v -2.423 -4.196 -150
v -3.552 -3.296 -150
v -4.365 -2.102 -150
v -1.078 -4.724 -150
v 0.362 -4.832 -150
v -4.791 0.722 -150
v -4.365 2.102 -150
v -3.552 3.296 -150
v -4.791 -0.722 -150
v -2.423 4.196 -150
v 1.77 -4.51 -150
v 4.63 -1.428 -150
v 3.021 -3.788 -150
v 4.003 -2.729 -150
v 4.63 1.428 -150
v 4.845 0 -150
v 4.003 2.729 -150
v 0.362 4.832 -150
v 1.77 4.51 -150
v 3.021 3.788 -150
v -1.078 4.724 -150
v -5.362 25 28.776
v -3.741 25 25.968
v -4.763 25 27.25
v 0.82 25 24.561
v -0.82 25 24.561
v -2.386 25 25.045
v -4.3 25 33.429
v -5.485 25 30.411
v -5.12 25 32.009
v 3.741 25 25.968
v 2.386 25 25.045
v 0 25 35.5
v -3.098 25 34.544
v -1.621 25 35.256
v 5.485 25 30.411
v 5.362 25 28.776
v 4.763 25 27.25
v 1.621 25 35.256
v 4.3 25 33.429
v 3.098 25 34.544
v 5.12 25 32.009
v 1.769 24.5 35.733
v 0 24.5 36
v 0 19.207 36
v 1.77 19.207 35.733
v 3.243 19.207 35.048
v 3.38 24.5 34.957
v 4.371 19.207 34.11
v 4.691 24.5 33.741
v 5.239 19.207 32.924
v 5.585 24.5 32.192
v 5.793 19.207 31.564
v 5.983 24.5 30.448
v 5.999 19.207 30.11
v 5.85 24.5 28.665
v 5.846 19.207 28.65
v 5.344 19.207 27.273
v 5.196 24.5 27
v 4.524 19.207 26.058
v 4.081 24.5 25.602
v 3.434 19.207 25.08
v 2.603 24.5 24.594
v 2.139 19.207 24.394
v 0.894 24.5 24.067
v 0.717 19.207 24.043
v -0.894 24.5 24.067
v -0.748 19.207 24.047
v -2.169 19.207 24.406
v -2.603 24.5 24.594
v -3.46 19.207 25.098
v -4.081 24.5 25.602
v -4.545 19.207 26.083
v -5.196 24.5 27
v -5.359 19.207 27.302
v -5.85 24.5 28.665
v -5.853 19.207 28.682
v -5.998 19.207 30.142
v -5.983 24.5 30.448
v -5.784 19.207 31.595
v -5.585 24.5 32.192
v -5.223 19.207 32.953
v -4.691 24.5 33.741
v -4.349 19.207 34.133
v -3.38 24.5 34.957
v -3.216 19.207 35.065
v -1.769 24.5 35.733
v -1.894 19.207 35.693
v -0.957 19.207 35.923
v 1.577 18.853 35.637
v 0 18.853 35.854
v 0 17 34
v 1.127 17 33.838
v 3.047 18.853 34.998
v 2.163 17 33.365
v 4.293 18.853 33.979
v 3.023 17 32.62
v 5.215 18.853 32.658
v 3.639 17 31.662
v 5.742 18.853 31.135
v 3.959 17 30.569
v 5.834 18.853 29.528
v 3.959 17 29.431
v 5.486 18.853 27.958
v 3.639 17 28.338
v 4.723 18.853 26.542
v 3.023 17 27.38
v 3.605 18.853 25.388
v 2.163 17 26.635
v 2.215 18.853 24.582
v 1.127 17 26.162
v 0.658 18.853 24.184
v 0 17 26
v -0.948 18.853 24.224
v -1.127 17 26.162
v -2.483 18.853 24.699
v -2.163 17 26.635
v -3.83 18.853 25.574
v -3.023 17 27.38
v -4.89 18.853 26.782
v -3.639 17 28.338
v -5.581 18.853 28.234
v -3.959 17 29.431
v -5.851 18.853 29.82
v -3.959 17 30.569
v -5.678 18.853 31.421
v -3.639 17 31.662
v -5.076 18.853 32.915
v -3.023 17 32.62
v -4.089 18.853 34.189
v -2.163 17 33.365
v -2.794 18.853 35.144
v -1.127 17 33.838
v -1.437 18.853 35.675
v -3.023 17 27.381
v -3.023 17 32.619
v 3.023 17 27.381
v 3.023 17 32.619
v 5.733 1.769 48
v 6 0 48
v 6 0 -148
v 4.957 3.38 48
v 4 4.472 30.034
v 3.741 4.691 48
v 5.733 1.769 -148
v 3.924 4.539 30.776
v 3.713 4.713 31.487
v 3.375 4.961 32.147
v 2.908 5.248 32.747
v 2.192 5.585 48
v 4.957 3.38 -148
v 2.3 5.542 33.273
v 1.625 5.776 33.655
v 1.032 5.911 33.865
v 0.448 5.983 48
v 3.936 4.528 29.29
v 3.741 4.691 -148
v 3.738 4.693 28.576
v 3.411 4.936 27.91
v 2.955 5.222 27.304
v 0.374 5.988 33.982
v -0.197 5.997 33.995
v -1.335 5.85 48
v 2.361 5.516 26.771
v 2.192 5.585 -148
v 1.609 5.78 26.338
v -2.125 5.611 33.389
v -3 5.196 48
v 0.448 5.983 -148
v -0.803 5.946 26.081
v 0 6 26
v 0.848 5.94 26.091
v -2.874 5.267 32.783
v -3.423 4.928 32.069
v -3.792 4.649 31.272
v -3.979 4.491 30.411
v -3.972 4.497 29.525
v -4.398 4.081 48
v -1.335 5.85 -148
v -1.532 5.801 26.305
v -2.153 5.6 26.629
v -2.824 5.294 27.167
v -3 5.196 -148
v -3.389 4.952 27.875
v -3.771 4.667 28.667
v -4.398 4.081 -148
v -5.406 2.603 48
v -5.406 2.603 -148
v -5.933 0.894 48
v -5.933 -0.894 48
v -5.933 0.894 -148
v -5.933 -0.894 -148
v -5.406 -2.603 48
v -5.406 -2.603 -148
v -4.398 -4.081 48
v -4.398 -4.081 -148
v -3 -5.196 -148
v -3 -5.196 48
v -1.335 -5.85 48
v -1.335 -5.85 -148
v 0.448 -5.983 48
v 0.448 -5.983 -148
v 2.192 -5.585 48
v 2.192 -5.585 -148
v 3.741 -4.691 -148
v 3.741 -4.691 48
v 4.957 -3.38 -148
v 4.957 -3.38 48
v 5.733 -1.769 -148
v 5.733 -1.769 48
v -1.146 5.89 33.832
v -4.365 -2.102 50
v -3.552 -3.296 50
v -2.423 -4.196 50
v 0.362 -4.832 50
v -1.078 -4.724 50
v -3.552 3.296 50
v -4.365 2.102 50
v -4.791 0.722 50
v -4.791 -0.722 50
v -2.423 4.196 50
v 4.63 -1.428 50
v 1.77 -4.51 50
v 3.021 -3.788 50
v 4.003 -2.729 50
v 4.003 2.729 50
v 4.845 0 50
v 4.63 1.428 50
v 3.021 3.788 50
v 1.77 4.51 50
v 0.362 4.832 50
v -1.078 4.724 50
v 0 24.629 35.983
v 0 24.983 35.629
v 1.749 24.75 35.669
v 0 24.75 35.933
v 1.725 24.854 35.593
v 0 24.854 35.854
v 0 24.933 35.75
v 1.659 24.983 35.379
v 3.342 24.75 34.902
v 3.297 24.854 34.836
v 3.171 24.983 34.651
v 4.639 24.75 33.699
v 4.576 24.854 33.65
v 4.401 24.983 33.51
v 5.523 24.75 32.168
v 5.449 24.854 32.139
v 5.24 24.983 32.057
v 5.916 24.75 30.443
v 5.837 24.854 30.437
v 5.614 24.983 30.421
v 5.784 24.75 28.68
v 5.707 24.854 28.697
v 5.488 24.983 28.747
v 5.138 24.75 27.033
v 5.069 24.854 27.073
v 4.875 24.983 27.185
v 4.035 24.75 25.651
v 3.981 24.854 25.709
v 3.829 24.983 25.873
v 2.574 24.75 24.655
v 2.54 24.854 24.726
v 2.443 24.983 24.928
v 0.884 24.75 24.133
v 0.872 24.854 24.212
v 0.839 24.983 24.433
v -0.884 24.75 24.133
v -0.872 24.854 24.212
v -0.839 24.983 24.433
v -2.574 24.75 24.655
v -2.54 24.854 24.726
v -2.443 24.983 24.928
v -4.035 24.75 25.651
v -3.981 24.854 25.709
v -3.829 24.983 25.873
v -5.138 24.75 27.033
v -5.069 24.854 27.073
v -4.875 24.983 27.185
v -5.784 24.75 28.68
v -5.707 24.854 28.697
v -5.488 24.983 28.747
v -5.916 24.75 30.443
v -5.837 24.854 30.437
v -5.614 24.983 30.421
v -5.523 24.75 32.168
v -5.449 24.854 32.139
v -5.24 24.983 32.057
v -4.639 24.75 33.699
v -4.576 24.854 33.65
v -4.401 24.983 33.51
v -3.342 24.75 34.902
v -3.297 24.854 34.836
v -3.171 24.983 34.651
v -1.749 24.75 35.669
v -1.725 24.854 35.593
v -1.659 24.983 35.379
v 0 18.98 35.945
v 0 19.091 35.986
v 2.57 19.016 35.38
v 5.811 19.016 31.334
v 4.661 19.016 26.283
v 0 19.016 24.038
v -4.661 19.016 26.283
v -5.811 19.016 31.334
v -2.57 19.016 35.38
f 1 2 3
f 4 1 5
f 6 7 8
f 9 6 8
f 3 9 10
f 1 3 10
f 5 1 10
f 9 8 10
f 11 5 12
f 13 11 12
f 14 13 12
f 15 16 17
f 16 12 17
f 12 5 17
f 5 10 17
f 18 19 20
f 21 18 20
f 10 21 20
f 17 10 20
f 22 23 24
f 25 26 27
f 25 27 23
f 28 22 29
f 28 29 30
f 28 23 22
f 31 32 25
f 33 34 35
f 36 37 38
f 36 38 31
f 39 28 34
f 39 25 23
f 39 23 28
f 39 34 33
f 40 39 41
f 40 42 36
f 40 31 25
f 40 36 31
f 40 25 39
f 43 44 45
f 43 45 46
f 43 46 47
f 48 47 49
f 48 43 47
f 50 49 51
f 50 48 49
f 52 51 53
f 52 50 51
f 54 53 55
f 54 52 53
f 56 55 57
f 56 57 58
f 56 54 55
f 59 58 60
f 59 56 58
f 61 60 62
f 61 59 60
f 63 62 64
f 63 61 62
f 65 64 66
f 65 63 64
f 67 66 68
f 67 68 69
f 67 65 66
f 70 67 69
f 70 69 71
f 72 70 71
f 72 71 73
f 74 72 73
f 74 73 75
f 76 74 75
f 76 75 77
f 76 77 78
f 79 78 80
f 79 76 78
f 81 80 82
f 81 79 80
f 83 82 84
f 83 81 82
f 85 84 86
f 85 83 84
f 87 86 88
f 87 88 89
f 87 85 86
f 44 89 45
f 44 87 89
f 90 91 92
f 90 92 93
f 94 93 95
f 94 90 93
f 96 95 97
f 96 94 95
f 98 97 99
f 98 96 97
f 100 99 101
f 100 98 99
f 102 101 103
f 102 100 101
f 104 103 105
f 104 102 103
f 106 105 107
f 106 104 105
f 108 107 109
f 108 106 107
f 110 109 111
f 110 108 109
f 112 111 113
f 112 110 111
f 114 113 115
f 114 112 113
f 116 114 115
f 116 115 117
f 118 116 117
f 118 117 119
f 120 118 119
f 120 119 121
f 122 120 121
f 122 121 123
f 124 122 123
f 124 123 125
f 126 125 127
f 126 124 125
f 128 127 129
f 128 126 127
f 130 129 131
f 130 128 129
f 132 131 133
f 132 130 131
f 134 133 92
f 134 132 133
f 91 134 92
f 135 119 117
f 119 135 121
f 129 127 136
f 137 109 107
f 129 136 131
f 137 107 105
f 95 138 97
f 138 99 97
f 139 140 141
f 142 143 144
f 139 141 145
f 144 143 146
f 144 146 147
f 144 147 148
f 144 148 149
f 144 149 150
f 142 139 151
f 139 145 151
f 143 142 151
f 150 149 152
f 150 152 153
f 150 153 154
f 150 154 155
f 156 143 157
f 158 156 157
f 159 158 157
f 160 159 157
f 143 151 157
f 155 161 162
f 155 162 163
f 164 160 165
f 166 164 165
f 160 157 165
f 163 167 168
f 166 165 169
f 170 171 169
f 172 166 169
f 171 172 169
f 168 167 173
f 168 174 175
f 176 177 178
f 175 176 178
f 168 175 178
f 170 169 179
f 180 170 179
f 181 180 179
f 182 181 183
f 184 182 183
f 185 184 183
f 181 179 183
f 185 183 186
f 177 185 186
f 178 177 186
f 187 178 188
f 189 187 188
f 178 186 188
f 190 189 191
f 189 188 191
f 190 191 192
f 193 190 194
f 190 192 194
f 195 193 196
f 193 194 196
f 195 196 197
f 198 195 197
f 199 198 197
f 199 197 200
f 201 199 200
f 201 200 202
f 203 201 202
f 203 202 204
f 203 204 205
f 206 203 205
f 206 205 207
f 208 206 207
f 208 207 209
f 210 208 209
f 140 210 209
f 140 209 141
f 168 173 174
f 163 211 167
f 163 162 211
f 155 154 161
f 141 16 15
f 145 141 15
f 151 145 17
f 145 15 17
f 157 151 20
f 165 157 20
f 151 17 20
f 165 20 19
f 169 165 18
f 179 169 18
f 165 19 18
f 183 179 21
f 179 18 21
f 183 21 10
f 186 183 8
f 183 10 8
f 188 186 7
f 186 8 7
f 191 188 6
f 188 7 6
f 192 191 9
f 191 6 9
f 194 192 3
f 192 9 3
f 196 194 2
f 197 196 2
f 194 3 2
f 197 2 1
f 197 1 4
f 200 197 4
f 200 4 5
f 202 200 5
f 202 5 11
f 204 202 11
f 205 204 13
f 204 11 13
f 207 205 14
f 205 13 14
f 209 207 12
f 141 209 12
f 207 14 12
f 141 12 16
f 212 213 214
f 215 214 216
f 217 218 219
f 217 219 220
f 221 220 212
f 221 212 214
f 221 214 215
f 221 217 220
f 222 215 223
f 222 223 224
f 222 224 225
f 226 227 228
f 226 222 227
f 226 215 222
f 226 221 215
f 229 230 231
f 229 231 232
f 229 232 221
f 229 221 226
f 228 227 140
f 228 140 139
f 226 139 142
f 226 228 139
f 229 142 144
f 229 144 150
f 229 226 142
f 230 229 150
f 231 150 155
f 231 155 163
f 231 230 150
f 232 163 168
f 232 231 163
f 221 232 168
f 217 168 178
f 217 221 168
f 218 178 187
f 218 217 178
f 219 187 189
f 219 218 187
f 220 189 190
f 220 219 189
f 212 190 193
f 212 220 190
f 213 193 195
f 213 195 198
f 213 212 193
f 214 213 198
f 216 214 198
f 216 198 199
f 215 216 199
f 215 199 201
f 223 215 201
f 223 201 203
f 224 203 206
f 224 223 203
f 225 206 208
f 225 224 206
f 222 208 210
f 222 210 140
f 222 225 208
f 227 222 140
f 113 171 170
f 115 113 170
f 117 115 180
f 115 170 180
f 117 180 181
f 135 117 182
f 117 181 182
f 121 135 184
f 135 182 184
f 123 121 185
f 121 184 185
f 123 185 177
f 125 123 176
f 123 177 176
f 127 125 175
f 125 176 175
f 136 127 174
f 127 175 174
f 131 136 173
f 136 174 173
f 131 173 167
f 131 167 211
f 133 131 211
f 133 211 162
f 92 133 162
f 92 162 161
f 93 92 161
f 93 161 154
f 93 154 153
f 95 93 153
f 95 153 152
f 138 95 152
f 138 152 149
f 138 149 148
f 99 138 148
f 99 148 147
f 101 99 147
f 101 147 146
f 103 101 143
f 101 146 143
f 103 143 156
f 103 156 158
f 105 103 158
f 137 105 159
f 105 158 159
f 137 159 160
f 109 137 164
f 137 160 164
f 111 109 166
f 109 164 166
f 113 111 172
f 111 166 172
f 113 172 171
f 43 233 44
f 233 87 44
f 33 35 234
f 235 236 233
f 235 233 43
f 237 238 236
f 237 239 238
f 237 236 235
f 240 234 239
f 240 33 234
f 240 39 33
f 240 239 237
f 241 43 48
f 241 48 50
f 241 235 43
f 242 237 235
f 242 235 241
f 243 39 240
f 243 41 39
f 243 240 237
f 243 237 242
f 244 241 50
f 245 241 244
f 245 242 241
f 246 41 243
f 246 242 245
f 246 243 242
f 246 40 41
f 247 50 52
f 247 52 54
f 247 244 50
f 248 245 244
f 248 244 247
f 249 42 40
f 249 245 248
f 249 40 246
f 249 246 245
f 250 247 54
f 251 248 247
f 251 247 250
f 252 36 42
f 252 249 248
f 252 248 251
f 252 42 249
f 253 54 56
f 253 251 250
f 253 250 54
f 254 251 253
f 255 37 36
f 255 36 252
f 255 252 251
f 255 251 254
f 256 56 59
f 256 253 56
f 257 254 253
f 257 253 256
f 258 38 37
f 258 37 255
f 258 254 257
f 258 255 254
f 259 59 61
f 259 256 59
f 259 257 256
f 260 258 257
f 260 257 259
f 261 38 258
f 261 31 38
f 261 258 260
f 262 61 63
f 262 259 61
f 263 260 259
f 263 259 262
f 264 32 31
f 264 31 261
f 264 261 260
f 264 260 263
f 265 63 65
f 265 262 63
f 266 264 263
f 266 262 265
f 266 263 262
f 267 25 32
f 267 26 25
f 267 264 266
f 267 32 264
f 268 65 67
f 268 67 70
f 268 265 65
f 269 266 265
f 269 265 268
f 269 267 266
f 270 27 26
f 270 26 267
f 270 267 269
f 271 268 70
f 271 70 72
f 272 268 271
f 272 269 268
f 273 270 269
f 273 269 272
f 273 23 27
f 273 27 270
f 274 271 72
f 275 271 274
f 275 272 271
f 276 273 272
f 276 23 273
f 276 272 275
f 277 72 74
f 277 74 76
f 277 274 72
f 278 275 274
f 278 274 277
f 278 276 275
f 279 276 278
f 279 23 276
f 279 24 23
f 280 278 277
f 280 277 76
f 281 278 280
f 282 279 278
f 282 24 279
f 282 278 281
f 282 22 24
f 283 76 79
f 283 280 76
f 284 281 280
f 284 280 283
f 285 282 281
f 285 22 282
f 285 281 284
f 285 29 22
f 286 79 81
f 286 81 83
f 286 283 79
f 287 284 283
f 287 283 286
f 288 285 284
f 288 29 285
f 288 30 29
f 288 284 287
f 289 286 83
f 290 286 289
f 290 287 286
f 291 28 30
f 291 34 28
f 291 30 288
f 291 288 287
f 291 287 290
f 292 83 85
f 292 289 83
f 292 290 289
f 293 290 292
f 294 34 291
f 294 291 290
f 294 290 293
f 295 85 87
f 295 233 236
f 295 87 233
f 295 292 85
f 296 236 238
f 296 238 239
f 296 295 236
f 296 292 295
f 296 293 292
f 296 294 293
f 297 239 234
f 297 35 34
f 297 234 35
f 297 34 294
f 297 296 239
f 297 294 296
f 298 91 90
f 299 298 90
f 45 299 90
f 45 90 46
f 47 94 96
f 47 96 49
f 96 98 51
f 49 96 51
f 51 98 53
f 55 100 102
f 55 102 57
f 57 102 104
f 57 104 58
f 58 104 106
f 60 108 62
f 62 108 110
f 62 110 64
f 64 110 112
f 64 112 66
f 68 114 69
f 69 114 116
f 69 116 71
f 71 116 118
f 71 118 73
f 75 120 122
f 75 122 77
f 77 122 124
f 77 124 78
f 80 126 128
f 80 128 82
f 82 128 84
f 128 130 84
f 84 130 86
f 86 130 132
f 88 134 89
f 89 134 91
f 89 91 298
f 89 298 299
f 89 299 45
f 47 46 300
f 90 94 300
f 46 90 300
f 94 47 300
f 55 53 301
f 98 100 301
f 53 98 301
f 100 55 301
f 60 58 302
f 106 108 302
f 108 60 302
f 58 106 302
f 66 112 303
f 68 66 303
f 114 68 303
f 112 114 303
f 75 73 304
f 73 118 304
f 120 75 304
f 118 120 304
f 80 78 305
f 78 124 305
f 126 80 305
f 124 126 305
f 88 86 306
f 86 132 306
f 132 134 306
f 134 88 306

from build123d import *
from OCP.BRepFilletAPI import BRepFilletAPI_MakeChamfer

# Parameters (mm, degrees)
BOSS_EXTRUDE1_DEPTH      = 50
BOSS_EXTRUDE1_DEPTH_BACK = 150
SKETCH1_R                = 6
SKETCH2_R                = 4
BOSS_EXTRUDE2_DEPTH      = 25
SKETCH3_R                = 6
BOSS_EXTRUDE3_DEPTH      = 8
CHAMFER1_SIZE            = 2
CHAMFER1_SIZE2           = 1.154700538
CHAMFER2_SIZE            = 2
FILLET1_R                = 0.5


with BuildPart() as part:
    # Sketch1 → Boss-Extrude1 (new, two sides: drawn at the far end of the back side and taken through both)
    with BuildSketch(Plane.XY.offset(-BOSS_EXTRUDE1_DEPTH_BACK)):
        Circle(SKETCH1_R)
    extrude(amount=BOSS_EXTRUDE1_DEPTH + BOSS_EXTRUDE1_DEPTH_BACK)

    # Sketch2 → Boss-Extrude2 (add)
    with BuildSketch(Plane(origin=(0, 0, 0), x_dir=(1, 0, 0), z_dir=(0, 1, 0))):
        with Locations(Location((0, -30, 0), (0, 0, 90))):
            Circle(SKETCH2_R)
    extrude(amount=BOSS_EXTRUDE2_DEPTH)

    # Sketch3 → Boss-Extrude3 (add)
    with BuildSketch(Plane(origin=(0, 25, 0), x_dir=(1, 0, 0), z_dir=(0, 1, 0))):
        with Locations(Location((0, -30, 0), (0, 0, 270))):
            Circle(SKETCH3_R)
    extrude(amount=-BOSS_EXTRUDE3_DEPTH)

    # Chamfer1: one chamfer whose edges measure the first distance from different faces: ONE call of the kernel's chamfer builder (chamfer() names one face for all edges)
    chamfer1_edges_1 = [part.edges().sort_by_distance(p)[0] for p in [
        (-6, 0, 50),
    ]]
    chamfer1_side_1 = [part.faces().sort_by_distance(p)[0] for p in [
        (-6, 0, 25),
    ]]
    chamfer1_edges_2 = [part.edges().sort_by_distance(p)[0] for p in [
        (-6, 0, -150),
    ]]
    chamfer1_side_2 = [part.faces().sort_by_distance(p)[0] for p in [
        (-6, 0, -75),
    ]]
    chamfer1 = BRepFilletAPI_MakeChamfer(part.part.solid().wrapped)
    for e in chamfer1_edges_1:
        chamfer1.Add(CHAMFER1_SIZE, CHAMFER1_SIZE2, e.wrapped, chamfer1_side_1[0].wrapped)  # the first distance lies on this face
    for e in chamfer1_edges_2:
        chamfer1.Add(CHAMFER1_SIZE, CHAMFER1_SIZE2, e.wrapped, chamfer1_side_2[0].wrapped)  # the first distance lies on this face
    add(Compound.cast(chamfer1.Shape()), mode=Mode.REPLACE)

    # Chamfer2
    chamfer2_edges = [part.edges().sort_by_distance(p)[0] for p in [
        (0, 17, 24),
    ]]
    chamfer(chamfer2_edges, length=CHAMFER2_SIZE - 0.0001)  # a hair under: the kernel refuses the full size

    # Fillet1
    fillet1_edges = [part.edges().sort_by_distance(p)[0] for p in [
        (0, 18.9999, 24),
        (0, 25, 24),
    ]]
    fillet(fillet1_edges, radius=FILLET1_R)


solid = part.part
